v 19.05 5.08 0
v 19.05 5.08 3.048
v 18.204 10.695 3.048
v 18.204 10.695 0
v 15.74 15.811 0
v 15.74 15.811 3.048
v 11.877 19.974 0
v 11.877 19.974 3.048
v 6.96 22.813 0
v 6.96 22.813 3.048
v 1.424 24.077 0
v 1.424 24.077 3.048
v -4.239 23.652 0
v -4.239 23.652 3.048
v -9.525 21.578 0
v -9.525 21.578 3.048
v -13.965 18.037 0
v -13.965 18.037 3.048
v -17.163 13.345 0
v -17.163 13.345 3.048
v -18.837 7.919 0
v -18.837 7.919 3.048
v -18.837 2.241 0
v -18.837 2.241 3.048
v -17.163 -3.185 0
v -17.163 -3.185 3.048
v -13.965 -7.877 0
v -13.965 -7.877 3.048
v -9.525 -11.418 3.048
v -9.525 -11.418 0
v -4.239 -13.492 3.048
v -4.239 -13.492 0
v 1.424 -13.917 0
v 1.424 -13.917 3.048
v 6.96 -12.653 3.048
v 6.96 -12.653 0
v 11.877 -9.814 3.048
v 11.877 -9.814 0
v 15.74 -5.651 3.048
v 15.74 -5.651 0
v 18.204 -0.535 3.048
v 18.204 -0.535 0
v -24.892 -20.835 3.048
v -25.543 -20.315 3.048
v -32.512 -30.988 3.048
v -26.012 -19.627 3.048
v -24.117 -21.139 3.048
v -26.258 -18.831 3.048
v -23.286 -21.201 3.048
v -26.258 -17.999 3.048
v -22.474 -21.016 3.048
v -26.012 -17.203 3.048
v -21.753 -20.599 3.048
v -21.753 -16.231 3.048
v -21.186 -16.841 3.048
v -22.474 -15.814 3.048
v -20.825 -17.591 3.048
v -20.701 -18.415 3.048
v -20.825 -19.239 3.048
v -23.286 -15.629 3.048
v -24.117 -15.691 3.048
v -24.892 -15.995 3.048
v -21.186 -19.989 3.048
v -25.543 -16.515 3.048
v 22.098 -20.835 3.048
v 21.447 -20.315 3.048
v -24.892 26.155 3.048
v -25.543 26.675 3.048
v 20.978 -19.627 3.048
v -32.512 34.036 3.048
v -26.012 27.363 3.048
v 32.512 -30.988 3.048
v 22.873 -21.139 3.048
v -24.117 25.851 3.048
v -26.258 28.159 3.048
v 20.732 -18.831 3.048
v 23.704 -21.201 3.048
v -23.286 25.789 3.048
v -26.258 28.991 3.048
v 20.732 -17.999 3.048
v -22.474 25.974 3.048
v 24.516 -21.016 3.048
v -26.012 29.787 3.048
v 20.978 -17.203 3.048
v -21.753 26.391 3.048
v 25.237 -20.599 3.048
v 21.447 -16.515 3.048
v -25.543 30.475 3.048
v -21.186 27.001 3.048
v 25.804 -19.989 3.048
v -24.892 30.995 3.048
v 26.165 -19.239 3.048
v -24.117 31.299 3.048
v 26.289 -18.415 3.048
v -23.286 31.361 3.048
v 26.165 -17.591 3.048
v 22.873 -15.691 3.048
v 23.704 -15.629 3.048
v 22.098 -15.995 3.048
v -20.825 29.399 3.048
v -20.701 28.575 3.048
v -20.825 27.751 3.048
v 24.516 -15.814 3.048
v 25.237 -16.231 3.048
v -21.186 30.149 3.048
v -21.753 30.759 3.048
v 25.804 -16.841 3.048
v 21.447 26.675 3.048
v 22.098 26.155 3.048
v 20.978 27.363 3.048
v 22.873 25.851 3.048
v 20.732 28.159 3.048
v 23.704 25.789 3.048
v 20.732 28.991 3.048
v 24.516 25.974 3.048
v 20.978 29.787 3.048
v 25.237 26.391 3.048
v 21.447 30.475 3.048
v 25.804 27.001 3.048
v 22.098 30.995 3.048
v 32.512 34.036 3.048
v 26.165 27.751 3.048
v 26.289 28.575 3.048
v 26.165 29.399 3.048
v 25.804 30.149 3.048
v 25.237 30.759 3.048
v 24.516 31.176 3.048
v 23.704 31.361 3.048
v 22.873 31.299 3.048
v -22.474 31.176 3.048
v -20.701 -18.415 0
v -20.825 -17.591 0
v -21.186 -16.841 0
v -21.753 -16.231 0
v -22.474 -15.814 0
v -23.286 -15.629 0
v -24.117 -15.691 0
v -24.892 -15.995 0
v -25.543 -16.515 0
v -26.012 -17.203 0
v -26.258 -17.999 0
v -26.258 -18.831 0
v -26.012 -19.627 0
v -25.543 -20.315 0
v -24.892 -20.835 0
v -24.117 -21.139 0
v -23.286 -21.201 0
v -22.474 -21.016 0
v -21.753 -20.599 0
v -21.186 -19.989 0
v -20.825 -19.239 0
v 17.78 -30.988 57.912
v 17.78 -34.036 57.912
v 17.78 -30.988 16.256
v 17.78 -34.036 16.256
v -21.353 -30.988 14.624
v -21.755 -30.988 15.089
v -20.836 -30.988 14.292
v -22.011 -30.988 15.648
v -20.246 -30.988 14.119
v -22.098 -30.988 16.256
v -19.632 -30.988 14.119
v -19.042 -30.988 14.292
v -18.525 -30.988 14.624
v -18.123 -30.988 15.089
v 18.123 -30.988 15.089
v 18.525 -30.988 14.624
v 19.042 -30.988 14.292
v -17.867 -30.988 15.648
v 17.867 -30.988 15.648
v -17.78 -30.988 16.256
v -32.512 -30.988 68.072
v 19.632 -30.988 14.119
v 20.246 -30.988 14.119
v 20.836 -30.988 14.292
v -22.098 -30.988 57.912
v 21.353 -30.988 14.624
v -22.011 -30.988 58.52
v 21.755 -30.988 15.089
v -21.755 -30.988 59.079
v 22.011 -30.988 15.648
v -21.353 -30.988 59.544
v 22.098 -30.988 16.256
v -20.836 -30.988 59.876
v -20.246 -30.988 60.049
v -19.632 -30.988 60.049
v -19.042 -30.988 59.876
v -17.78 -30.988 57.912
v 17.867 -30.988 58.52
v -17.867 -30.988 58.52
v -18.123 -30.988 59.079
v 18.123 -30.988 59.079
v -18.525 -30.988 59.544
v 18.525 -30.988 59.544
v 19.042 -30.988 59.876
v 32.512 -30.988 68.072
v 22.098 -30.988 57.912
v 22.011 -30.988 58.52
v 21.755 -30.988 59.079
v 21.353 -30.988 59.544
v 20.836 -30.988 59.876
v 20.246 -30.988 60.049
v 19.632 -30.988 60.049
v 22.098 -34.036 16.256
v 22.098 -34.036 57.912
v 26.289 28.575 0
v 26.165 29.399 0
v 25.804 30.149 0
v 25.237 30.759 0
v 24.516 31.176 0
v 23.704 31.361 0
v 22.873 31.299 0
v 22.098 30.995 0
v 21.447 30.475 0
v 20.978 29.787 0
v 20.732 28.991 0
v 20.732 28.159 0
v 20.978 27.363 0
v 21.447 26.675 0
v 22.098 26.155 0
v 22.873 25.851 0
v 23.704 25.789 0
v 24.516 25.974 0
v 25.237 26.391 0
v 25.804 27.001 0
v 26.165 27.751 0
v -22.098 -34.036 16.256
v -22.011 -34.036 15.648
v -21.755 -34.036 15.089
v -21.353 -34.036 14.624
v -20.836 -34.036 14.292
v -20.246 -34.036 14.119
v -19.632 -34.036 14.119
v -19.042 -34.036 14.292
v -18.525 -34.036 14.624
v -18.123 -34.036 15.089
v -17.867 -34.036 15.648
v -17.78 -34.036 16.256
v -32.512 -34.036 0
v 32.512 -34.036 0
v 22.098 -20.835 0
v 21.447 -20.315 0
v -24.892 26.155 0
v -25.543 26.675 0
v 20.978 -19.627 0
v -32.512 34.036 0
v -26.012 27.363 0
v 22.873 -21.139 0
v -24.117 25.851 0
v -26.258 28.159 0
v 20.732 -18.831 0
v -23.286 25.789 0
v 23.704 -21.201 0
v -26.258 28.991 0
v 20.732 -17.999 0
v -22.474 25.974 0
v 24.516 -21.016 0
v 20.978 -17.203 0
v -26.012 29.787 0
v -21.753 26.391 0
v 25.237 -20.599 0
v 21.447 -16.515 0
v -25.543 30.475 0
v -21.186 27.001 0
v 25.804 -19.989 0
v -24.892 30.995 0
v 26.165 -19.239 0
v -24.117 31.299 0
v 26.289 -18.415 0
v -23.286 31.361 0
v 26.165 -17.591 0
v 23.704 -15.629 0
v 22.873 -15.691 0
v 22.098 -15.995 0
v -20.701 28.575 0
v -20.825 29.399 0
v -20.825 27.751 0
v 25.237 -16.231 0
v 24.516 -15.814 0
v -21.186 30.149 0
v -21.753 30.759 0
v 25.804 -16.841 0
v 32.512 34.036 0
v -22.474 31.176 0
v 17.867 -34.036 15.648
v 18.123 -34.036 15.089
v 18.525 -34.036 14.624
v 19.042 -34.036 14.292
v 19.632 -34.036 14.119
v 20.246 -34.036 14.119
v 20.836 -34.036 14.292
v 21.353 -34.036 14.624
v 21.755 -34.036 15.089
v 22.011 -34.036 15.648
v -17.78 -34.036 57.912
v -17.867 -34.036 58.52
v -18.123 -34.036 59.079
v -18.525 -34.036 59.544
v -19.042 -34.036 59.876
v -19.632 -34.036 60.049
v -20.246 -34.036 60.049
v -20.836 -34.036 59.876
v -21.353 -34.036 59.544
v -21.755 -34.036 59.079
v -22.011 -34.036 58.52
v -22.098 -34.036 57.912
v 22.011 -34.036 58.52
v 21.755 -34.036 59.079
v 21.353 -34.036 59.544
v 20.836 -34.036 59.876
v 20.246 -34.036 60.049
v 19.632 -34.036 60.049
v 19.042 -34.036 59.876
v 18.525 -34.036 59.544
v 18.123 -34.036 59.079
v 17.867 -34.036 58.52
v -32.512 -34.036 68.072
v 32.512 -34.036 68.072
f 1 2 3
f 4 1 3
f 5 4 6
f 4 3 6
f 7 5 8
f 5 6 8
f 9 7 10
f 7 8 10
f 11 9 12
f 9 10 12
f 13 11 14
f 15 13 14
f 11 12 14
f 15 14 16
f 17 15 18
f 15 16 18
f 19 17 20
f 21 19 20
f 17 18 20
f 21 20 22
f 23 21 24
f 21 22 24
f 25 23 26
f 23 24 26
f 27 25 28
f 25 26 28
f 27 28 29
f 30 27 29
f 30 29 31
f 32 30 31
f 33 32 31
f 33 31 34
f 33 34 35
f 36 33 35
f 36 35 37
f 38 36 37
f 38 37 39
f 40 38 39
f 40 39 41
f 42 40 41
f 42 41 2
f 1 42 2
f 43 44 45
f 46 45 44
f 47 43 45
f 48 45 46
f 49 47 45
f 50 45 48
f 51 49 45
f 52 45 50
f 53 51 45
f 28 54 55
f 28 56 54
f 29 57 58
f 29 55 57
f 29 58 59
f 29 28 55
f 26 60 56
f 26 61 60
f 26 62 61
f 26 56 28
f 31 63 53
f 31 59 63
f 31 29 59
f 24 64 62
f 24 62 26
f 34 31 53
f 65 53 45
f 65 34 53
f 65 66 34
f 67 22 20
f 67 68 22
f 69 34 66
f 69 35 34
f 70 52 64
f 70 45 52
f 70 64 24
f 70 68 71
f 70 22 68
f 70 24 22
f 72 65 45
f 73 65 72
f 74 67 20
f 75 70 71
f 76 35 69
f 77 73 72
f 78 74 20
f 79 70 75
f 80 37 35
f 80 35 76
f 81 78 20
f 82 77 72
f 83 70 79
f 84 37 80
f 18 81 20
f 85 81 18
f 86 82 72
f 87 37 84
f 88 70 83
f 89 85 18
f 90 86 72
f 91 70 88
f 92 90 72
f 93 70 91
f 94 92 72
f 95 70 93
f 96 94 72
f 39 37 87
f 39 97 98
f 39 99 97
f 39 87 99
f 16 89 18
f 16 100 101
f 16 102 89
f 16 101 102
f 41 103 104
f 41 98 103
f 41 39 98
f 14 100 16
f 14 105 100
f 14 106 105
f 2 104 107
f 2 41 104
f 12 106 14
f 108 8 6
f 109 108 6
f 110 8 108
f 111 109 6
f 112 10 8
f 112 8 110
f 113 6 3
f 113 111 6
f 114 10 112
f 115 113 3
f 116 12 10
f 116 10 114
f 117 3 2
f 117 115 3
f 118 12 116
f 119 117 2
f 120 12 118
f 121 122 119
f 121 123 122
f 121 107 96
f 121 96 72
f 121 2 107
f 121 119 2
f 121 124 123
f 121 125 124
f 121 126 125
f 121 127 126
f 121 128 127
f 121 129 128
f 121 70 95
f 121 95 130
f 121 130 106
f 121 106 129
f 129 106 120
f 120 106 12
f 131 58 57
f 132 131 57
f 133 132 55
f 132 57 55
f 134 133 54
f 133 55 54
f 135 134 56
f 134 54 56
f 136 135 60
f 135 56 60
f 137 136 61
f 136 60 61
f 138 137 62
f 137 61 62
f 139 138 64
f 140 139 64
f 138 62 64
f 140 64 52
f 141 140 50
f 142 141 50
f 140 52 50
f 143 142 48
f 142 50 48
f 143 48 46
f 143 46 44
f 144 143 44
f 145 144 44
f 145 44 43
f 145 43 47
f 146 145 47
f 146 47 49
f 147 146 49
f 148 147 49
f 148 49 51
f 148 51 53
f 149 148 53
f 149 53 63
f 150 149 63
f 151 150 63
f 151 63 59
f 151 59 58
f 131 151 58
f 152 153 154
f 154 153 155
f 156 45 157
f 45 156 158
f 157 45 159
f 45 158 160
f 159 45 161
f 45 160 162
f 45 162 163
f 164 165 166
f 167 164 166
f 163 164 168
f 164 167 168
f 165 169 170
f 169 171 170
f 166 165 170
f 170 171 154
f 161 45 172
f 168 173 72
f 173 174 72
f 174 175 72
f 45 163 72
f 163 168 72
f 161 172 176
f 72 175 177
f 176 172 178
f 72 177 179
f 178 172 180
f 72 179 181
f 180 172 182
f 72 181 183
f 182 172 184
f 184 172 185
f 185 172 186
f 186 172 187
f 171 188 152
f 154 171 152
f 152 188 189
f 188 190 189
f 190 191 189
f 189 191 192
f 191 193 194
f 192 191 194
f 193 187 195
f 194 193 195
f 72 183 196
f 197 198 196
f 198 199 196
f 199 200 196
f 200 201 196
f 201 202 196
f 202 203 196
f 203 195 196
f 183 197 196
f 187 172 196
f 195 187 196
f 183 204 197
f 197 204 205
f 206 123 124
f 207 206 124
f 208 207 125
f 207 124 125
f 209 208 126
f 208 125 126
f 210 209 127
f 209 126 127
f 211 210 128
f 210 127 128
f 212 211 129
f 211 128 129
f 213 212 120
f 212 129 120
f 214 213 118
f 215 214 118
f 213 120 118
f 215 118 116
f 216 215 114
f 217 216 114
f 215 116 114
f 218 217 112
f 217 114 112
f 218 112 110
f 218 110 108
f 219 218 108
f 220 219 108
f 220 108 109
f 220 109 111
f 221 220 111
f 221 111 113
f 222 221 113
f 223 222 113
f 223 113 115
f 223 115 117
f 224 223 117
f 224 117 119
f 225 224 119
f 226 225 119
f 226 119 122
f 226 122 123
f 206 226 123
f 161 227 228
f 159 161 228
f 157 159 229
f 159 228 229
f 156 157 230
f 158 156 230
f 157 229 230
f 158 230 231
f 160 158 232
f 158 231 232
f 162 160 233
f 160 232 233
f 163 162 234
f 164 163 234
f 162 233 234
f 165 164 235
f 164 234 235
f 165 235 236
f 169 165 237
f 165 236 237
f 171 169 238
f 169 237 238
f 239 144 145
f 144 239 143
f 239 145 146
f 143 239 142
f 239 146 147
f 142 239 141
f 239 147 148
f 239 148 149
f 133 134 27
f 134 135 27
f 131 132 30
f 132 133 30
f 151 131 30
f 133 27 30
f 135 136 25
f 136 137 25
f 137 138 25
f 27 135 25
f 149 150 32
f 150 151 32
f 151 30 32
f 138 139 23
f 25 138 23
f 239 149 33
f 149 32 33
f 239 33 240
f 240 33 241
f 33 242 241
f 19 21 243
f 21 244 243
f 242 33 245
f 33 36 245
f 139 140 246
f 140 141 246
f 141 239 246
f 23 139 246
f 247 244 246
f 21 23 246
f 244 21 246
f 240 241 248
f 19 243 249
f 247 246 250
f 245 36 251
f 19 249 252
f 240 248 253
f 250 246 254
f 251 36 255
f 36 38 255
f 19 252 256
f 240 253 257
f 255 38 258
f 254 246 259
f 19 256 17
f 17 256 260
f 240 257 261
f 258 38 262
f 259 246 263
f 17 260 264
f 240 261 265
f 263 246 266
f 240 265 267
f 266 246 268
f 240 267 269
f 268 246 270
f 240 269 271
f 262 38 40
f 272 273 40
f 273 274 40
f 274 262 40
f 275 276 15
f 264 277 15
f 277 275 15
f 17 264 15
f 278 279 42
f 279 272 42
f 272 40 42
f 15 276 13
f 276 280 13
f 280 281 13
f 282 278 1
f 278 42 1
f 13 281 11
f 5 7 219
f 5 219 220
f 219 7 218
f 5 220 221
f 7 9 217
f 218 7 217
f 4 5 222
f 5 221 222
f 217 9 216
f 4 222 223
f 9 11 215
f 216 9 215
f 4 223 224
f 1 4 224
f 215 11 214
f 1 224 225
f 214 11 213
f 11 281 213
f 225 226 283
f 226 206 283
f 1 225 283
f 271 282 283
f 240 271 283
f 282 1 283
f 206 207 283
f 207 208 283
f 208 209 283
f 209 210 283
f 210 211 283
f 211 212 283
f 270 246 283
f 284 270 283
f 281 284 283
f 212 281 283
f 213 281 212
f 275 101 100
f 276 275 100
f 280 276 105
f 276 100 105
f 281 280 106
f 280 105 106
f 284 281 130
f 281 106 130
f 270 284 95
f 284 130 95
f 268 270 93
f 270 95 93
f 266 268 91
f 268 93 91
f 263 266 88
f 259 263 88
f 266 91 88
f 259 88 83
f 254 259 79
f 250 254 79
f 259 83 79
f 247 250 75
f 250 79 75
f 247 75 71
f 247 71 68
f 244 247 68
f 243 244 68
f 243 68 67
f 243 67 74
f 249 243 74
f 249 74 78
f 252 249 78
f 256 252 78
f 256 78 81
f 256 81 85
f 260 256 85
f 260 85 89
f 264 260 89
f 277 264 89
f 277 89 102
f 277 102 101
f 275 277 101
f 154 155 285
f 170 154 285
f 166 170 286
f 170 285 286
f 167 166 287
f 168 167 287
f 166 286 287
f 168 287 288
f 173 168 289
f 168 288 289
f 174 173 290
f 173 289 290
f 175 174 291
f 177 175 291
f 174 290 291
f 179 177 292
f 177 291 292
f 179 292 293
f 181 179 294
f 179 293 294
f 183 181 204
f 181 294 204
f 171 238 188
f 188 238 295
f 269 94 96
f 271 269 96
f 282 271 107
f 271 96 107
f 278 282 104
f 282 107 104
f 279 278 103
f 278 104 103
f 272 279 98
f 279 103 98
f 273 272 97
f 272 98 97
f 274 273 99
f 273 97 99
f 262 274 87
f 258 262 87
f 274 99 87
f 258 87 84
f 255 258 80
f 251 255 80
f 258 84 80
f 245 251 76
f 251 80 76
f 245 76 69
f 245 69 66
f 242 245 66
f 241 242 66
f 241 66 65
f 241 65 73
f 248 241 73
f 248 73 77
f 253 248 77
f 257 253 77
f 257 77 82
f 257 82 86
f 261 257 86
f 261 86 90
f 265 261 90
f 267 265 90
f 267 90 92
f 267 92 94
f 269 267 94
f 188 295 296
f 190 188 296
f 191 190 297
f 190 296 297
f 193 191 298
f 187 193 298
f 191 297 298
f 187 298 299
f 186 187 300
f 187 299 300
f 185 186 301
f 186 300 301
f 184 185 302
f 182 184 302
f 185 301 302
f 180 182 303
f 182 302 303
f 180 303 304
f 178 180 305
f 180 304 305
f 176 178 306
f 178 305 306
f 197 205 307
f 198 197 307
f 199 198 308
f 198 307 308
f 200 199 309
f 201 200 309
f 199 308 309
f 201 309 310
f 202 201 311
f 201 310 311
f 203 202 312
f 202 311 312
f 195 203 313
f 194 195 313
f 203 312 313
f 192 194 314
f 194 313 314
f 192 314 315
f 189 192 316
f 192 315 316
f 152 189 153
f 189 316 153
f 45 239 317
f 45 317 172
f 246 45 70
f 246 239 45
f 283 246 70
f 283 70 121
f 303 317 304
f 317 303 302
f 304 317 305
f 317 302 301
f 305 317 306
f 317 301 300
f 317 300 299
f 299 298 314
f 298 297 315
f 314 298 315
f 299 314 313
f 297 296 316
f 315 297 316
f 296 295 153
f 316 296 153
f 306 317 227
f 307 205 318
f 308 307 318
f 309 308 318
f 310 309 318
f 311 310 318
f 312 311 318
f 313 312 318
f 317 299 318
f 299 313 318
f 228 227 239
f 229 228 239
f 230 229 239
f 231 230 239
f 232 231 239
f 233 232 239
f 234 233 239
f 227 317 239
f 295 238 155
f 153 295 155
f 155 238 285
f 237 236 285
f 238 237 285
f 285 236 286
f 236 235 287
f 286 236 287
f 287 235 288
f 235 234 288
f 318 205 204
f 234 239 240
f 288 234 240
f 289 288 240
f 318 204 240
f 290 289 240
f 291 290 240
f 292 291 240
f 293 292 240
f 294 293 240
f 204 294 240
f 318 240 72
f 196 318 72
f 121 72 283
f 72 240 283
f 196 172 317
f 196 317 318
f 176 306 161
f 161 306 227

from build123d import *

# Parameters (mm, degrees)
F0_W     = 65.024
F0_H     = 68.072
F1_DEPTH = 68.072
F2_W     = 65.024
F2_H     = 65.024
F3_DEPTH = 65.024
F4_R     = 19.05
F4_R_2   = 2.794
F5_DEPTH = 3.049
F7_DEPTH = 68.073


with BuildPart() as f1:
    # F0 (on Top) → F1 (new body)
    with BuildSketch(Plane.XY):
        Rectangle(F0_W, F0_H)
    extrude(amount=F1_DEPTH)

    # F2 (on face) → F3 (cut)
    with BuildSketch(Plane.XY.offset(68.072)):
        with Locations((0, 1.524)):
            Rectangle(F2_W, F2_H)
    extrude(amount=-F3_DEPTH, mode=Mode.SUBTRACT)

    # F4 (on face) → F5 (cut, through all)
    with BuildSketch(Plane.XY.offset(3.048)):
        with Locations((0, 5.08)):
            Circle(F4_R)
        with Locations((-23.495, 28.575)):
            Circle(F4_R_2)
        with Locations((23.495, 28.575)):
            Circle(F4_R_2)
        with Locations((23.495, -18.415)):
            Circle(F4_R_2)
        with Locations((-23.495, -18.415)):
            Circle(F4_R_2)
    extrude(amount=-F5_DEPTH, mode=Mode.SUBTRACT)

    # F6 (on face) → F7 (cut, through all)
    with BuildSketch(Plane.XZ.offset(34.036)):
        with BuildLine():
            ThreePointArc((-17.78, 57.912), (-19.939, 60.071), (-22.098, 57.912))
            Line((-22.098, 57.912), (-22.098, 16.256))
            ThreePointArc((-22.098, 16.256), (-19.939, 14.097), (-17.78, 16.256))
            Line((-17.78, 16.256), (-17.78, 57.912))
        make_face()
        with BuildLine():
            ThreePointArc((22.098, 57.912), (19.939, 60.071), (17.78, 57.912))
            Line((17.78, 57.912), (17.78, 16.256))
            ThreePointArc((17.78, 16.256), (19.939, 14.097), (22.098, 16.256))
            Line((22.098, 16.256), (22.098, 57.912))
        make_face()
    extrude(amount=-F7_DEPTH, mode=Mode.SUBTRACT)


solid = f1.part
